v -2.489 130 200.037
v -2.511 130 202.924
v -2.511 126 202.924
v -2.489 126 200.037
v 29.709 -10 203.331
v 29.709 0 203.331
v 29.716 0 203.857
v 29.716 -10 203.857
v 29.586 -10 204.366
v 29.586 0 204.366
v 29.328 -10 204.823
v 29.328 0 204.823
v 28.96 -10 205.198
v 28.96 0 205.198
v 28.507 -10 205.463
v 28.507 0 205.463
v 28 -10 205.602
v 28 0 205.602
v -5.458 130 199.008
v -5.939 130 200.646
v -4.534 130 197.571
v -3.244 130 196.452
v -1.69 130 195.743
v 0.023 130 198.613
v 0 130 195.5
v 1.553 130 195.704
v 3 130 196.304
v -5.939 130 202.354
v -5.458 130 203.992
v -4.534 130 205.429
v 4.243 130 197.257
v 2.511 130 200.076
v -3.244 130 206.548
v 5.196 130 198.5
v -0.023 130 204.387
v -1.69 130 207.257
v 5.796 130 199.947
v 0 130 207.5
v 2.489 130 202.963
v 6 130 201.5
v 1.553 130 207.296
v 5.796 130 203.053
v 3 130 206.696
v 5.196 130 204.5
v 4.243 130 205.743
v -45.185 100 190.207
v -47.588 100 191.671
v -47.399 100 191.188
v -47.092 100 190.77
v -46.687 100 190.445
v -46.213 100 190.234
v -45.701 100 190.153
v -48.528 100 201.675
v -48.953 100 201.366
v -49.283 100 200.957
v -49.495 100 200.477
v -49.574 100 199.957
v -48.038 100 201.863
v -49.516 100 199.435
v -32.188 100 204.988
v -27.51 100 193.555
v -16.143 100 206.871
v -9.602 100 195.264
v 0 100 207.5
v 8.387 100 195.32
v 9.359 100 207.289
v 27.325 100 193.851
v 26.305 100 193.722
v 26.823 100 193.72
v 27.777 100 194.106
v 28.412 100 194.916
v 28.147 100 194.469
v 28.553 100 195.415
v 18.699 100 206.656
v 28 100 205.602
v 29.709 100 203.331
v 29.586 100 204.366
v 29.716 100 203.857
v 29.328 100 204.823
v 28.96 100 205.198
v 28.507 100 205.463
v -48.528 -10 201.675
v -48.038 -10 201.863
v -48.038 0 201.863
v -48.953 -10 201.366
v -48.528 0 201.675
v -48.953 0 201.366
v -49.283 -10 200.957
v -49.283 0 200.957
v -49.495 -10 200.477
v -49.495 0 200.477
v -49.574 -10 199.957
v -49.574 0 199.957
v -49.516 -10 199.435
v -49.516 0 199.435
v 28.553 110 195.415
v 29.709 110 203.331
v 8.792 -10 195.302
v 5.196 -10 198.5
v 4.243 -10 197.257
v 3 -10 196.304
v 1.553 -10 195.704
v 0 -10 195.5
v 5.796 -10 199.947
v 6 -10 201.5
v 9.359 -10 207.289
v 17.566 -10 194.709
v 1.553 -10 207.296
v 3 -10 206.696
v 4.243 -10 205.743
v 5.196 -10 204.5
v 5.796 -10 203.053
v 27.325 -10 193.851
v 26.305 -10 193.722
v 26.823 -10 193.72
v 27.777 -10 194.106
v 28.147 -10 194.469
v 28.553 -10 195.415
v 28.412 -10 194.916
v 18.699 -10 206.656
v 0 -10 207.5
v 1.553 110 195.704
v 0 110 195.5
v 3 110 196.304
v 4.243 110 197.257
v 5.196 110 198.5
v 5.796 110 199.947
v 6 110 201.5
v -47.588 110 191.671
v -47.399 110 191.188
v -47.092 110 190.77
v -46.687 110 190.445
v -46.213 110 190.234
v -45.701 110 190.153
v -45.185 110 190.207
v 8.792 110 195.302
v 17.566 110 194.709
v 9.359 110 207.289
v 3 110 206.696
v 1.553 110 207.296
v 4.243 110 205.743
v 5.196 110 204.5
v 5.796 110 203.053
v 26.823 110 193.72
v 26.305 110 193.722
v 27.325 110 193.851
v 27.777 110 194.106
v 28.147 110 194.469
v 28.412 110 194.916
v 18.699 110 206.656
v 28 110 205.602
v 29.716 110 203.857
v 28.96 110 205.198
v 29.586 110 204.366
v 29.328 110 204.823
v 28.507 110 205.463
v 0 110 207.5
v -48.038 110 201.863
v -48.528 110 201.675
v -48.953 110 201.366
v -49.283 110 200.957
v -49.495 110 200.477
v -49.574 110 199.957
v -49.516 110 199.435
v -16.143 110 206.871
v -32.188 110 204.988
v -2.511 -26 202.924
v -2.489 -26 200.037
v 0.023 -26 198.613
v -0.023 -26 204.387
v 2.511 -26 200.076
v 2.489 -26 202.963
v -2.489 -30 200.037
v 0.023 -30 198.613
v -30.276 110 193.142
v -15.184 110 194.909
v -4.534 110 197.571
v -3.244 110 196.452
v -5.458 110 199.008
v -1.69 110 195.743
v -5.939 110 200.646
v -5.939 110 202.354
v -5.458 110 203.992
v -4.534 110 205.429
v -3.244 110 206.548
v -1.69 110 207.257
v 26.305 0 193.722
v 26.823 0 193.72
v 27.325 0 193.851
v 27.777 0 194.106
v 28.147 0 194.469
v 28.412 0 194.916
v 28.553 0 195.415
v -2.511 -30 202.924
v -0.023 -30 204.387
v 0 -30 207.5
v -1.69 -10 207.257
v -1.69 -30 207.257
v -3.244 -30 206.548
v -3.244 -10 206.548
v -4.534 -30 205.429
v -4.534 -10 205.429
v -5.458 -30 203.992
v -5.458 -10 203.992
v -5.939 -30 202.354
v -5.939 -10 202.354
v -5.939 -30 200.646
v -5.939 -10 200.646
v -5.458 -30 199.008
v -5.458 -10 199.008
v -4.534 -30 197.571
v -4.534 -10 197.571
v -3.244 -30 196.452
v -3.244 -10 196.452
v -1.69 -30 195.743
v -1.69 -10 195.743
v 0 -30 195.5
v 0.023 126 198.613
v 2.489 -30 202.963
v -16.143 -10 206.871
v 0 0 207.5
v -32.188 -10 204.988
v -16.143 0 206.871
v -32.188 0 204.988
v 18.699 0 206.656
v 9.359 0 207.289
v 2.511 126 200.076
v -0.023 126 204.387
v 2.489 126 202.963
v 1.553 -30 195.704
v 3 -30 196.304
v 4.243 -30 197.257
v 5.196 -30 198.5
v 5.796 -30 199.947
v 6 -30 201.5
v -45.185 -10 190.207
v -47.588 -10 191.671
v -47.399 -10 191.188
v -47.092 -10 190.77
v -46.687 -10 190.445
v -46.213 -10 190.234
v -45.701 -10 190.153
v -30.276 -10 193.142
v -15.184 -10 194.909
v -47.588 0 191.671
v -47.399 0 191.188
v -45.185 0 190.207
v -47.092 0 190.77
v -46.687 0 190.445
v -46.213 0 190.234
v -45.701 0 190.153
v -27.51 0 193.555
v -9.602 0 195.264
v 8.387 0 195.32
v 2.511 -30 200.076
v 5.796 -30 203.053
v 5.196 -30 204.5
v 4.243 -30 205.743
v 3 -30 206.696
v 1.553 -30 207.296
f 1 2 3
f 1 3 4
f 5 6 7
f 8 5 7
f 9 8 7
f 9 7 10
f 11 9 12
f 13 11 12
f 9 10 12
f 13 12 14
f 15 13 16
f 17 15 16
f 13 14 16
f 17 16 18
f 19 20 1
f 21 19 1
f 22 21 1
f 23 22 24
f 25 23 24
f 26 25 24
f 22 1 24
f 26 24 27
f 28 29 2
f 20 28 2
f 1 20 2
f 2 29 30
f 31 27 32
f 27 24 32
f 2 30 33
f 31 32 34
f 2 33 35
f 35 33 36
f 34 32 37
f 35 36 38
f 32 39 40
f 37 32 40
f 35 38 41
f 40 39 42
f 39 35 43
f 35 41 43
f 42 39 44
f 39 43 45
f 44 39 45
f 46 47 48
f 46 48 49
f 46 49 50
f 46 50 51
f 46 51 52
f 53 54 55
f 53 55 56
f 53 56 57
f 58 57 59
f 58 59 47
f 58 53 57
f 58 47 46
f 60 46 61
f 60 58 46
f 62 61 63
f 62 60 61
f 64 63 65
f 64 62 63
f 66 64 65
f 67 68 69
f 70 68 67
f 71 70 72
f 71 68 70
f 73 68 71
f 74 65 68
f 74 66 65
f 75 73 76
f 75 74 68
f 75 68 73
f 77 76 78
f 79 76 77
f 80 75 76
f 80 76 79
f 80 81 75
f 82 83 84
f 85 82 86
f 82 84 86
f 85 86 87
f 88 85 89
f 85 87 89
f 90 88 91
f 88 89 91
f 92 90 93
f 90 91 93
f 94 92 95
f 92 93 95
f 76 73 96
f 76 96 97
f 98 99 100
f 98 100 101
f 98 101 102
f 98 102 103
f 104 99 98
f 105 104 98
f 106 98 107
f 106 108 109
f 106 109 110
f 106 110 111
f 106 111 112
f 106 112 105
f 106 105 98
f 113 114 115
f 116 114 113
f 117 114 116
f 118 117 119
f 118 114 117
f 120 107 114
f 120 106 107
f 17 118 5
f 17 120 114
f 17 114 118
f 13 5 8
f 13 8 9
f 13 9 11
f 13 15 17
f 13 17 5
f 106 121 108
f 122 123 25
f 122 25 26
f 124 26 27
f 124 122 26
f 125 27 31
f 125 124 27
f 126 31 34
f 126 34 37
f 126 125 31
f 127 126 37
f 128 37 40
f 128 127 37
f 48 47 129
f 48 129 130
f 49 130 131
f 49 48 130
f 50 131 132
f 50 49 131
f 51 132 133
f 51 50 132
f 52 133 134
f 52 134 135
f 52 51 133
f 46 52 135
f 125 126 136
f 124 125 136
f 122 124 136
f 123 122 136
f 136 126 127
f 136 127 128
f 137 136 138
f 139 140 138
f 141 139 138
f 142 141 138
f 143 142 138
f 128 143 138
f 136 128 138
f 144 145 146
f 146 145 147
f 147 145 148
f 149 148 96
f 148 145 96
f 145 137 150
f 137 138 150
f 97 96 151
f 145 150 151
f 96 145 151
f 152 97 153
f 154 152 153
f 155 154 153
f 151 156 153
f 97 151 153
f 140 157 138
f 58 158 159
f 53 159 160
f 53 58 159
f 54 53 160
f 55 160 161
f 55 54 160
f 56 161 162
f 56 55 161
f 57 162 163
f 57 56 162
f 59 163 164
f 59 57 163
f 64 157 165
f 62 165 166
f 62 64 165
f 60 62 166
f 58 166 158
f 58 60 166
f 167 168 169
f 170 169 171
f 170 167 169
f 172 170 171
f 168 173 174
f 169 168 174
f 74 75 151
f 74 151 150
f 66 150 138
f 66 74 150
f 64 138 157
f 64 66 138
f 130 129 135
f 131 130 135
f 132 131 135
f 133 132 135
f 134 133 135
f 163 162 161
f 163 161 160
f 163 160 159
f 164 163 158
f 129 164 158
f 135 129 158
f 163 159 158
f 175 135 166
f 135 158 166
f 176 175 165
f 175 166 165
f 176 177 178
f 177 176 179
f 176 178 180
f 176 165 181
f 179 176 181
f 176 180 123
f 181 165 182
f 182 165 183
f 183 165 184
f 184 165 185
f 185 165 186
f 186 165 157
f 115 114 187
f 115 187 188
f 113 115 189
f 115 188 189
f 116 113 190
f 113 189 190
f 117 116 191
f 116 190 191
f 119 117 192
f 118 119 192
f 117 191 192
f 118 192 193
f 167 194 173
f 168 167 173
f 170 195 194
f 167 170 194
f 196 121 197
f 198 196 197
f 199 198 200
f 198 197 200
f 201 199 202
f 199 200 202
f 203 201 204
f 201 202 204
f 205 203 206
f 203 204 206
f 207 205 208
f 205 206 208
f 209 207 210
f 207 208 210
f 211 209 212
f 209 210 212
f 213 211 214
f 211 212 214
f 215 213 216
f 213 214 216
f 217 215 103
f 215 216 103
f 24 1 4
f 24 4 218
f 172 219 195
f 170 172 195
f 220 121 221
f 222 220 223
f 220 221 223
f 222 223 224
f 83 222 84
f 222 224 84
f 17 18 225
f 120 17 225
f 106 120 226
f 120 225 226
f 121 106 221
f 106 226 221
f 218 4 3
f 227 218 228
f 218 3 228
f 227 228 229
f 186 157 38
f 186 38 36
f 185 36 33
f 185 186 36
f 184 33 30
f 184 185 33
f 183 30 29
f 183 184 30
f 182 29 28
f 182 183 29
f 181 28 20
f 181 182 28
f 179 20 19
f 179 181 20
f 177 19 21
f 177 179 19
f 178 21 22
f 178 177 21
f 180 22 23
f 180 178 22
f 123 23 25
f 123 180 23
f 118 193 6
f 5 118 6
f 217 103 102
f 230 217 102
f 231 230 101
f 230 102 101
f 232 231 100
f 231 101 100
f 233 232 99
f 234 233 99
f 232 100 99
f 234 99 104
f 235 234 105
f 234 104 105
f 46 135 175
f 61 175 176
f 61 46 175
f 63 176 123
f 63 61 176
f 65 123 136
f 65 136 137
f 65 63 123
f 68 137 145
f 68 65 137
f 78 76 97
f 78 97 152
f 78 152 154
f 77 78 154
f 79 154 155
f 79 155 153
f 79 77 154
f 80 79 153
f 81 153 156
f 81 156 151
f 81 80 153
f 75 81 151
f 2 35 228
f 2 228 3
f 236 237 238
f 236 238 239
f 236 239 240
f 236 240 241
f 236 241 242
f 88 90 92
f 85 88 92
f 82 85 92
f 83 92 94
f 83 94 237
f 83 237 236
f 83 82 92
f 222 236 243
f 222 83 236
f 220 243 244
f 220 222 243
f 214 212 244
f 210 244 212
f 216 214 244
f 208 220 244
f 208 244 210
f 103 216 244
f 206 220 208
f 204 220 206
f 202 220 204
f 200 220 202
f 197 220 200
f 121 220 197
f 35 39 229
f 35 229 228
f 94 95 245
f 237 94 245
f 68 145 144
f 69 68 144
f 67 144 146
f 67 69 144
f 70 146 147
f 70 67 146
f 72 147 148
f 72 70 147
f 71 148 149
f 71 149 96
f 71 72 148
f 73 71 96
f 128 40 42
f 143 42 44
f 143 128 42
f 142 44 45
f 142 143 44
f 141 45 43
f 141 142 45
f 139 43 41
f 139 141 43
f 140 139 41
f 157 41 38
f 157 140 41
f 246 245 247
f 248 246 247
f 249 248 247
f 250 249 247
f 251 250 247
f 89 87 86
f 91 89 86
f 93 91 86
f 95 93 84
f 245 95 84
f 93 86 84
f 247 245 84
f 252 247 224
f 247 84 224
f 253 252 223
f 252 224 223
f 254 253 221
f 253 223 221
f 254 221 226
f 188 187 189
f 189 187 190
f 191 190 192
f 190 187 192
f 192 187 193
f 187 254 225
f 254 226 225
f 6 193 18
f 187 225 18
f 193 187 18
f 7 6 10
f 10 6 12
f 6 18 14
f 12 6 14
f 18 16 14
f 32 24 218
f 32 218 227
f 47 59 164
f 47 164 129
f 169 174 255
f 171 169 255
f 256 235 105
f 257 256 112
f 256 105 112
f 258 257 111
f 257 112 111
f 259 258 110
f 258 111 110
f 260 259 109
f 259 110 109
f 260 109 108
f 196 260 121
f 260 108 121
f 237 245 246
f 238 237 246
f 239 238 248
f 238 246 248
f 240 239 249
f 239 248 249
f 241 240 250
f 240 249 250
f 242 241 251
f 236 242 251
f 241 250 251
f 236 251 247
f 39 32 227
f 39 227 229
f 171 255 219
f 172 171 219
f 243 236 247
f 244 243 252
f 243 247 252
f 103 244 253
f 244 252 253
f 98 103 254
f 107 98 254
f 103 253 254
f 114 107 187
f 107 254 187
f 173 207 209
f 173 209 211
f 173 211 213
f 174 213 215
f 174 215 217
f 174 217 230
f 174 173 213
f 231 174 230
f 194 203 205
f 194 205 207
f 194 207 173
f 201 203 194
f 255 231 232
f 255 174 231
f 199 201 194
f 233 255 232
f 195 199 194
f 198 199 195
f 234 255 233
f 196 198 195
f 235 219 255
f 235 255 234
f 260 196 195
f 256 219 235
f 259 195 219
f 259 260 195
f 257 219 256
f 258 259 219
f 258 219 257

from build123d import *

# Parameters (mm, degrees)
F1_DEPTH = 10
F2_DEPTH = 30
F4_DEPTH = 4


with BuildPart() as f1:
    # F0 (on Front) → F1 (new body)
    with BuildSketch(Plane.XZ):
        with BuildLine():
            ThreePointArc((-45.1846064491, 190.2067331617), (-22.7467983043, 194.1721740284), (1.54e-08, 195.5))
            ThreePointArc((1.54e-08, 195.5), (-6, 201.4999999777), (-2.92e-08, 207.5))
            ThreePointArc((-2.92e-08, 207.5), (-24.1836455313, 206.0859075454), (-48.037672618, 201.8629039954))
            ThreePointArc((-48.037672618, 201.8629039954), (-49.2829346167, 200.9573307622), (-49.5157270866, 199.43530974))
            Line((-49.5157270866, 199.43530974), (-47.5879212429, 191.6706543834))
            ThreePointArc((-47.5879212429, 191.6706543834), (-46.6872830902, 190.4445114408), (-45.1846064491, 190.2067331617))
        make_face()
        with BuildLine():
            ThreePointArc((-2.92e-08, 207.5), (-6, 201.4999999777), (1.54e-08, 195.5))
            Line((0, 195.5), (0, 198.5))
            ThreePointArc((0, 198.5), (-3, 201.5), (0, 204.5))
            Line((0, 204.5), (0, 207.5))
        make_face()
        with BuildLine():
            Line((0, 204.5), (0, 198.5))
            ThreePointArc((0, 198.5), (2.1213203436, 199.3786796564), (3, 201.5))
            ThreePointArc((3, 201.5), (2.1213203436, 203.6213203436), (0, 204.5))
        make_face()
        with BuildLine():
            ThreePointArc((0, 204.5), (-3, 201.5), (0, 198.5))
            Line((0, 198.5), (0, 204.5))
        make_face()
        with BuildLine():
            Line((0, 198.5), (0, 195.5))
            ThreePointArc((1.54e-08, 195.5), (4.2426406926, 197.2573593183), (6, 201.5))
            ThreePointArc((6, 201.5), (4.2426406768, 205.7426406975), (-2.92e-08, 207.5))
            Line((0, 207.5), (0, 204.5))
            ThreePointArc((0, 204.5), (2.1213203436, 203.6213203436), (3, 201.5))
            ThreePointArc((3, 201.5), (2.1213203436, 199.3786796564), (0, 198.5))
        make_face()
        with BuildLine():
            ThreePointArc((6, 201.5), (4.2426406926, 197.2573593183), (1.54e-08, 195.5))
            ThreePointArc((1.54e-08, 195.5), (13.1823341475, 195.0550590639), (26.3046645958, 193.7222615512))
            ThreePointArc((26.3046645958, 193.7222615512), (27.7767617356, 194.1063261405), (28.5527527457, 195.4149183421))
            Line((28.5527527457, 195.4149183421), (29.709436252, 203.3312553386))
            ThreePointArc((29.709436252, 203.3312553386), (29.3284354626, 204.823092704), (28.0003322506, 205.6021191376))
            ThreePointArc((28.0003322506, 205.6021191376), (14.03228916, 207.0249860788), (-2.92e-08, 207.5))
            ThreePointArc((-2.92e-08, 207.5), (4.2426406768, 205.7426406975), (6, 201.5))
        make_face()
    extrude(amount=F1_DEPTH)

    # F0 (on Front) → F2 (join)
    with BuildSketch(Plane.XZ):
        with BuildLine():
            ThreePointArc((0, 204.5), (-3, 201.5), (0, 198.5))
            Line((0, 198.5), (0, 204.5))
        make_face()
        with BuildLine():
            Line((0, 204.5), (0, 198.5))
            ThreePointArc((0, 198.5), (2.1213203436, 199.3786796564), (3, 201.5))
            ThreePointArc((3, 201.5), (2.1213203436, 203.6213203436), (0, 204.5))
        make_face()
        with BuildLine():
            ThreePointArc((-2.92e-08, 207.5), (-6, 201.4999999777), (1.54e-08, 195.5))
            Line((0, 195.5), (0, 198.5))
            ThreePointArc((0, 198.5), (-3, 201.5), (0, 204.5))
            Line((0, 204.5), (0, 207.5))
        make_face()
        with BuildLine():
            Line((0, 198.5), (0, 195.5))
            ThreePointArc((1.54e-08, 195.5), (4.2426406926, 197.2573593183), (6, 201.5))
            ThreePointArc((6, 201.5), (4.2426406768, 205.7426406975), (-2.92e-08, 207.5))
            Line((0, 207.5), (0, 204.5))
            ThreePointArc((0, 204.5), (2.1213203436, 203.6213203436), (3, 201.5))
            ThreePointArc((3, 201.5), (2.1213203436, 199.3786796564), (0, 198.5))
        make_face()
    extrude(amount=F2_DEPTH)

    # F3 (on face) → F4 (cut)
    with BuildSketch(Plane.XZ.offset(30)):
        Polygon((0.0226020234, 198.6133371375), (2.5112243828, 200.0762424952), (2.4886223594, 202.9629053577), (-0.0226020234, 204.3866628625), (-2.5112243828, 202.9237575048), (-2.4886223594, 200.0370946423), align=None)
    extrude(amount=-F4_DEPTH, mode=Mode.SUBTRACT)


with BuildPart() as f6_1:
    # F6: instance of F1
    add(f1.part.mirror(Plane.XZ.offset(-50)))


solid = Compound([f1.part, f6_1.part])
